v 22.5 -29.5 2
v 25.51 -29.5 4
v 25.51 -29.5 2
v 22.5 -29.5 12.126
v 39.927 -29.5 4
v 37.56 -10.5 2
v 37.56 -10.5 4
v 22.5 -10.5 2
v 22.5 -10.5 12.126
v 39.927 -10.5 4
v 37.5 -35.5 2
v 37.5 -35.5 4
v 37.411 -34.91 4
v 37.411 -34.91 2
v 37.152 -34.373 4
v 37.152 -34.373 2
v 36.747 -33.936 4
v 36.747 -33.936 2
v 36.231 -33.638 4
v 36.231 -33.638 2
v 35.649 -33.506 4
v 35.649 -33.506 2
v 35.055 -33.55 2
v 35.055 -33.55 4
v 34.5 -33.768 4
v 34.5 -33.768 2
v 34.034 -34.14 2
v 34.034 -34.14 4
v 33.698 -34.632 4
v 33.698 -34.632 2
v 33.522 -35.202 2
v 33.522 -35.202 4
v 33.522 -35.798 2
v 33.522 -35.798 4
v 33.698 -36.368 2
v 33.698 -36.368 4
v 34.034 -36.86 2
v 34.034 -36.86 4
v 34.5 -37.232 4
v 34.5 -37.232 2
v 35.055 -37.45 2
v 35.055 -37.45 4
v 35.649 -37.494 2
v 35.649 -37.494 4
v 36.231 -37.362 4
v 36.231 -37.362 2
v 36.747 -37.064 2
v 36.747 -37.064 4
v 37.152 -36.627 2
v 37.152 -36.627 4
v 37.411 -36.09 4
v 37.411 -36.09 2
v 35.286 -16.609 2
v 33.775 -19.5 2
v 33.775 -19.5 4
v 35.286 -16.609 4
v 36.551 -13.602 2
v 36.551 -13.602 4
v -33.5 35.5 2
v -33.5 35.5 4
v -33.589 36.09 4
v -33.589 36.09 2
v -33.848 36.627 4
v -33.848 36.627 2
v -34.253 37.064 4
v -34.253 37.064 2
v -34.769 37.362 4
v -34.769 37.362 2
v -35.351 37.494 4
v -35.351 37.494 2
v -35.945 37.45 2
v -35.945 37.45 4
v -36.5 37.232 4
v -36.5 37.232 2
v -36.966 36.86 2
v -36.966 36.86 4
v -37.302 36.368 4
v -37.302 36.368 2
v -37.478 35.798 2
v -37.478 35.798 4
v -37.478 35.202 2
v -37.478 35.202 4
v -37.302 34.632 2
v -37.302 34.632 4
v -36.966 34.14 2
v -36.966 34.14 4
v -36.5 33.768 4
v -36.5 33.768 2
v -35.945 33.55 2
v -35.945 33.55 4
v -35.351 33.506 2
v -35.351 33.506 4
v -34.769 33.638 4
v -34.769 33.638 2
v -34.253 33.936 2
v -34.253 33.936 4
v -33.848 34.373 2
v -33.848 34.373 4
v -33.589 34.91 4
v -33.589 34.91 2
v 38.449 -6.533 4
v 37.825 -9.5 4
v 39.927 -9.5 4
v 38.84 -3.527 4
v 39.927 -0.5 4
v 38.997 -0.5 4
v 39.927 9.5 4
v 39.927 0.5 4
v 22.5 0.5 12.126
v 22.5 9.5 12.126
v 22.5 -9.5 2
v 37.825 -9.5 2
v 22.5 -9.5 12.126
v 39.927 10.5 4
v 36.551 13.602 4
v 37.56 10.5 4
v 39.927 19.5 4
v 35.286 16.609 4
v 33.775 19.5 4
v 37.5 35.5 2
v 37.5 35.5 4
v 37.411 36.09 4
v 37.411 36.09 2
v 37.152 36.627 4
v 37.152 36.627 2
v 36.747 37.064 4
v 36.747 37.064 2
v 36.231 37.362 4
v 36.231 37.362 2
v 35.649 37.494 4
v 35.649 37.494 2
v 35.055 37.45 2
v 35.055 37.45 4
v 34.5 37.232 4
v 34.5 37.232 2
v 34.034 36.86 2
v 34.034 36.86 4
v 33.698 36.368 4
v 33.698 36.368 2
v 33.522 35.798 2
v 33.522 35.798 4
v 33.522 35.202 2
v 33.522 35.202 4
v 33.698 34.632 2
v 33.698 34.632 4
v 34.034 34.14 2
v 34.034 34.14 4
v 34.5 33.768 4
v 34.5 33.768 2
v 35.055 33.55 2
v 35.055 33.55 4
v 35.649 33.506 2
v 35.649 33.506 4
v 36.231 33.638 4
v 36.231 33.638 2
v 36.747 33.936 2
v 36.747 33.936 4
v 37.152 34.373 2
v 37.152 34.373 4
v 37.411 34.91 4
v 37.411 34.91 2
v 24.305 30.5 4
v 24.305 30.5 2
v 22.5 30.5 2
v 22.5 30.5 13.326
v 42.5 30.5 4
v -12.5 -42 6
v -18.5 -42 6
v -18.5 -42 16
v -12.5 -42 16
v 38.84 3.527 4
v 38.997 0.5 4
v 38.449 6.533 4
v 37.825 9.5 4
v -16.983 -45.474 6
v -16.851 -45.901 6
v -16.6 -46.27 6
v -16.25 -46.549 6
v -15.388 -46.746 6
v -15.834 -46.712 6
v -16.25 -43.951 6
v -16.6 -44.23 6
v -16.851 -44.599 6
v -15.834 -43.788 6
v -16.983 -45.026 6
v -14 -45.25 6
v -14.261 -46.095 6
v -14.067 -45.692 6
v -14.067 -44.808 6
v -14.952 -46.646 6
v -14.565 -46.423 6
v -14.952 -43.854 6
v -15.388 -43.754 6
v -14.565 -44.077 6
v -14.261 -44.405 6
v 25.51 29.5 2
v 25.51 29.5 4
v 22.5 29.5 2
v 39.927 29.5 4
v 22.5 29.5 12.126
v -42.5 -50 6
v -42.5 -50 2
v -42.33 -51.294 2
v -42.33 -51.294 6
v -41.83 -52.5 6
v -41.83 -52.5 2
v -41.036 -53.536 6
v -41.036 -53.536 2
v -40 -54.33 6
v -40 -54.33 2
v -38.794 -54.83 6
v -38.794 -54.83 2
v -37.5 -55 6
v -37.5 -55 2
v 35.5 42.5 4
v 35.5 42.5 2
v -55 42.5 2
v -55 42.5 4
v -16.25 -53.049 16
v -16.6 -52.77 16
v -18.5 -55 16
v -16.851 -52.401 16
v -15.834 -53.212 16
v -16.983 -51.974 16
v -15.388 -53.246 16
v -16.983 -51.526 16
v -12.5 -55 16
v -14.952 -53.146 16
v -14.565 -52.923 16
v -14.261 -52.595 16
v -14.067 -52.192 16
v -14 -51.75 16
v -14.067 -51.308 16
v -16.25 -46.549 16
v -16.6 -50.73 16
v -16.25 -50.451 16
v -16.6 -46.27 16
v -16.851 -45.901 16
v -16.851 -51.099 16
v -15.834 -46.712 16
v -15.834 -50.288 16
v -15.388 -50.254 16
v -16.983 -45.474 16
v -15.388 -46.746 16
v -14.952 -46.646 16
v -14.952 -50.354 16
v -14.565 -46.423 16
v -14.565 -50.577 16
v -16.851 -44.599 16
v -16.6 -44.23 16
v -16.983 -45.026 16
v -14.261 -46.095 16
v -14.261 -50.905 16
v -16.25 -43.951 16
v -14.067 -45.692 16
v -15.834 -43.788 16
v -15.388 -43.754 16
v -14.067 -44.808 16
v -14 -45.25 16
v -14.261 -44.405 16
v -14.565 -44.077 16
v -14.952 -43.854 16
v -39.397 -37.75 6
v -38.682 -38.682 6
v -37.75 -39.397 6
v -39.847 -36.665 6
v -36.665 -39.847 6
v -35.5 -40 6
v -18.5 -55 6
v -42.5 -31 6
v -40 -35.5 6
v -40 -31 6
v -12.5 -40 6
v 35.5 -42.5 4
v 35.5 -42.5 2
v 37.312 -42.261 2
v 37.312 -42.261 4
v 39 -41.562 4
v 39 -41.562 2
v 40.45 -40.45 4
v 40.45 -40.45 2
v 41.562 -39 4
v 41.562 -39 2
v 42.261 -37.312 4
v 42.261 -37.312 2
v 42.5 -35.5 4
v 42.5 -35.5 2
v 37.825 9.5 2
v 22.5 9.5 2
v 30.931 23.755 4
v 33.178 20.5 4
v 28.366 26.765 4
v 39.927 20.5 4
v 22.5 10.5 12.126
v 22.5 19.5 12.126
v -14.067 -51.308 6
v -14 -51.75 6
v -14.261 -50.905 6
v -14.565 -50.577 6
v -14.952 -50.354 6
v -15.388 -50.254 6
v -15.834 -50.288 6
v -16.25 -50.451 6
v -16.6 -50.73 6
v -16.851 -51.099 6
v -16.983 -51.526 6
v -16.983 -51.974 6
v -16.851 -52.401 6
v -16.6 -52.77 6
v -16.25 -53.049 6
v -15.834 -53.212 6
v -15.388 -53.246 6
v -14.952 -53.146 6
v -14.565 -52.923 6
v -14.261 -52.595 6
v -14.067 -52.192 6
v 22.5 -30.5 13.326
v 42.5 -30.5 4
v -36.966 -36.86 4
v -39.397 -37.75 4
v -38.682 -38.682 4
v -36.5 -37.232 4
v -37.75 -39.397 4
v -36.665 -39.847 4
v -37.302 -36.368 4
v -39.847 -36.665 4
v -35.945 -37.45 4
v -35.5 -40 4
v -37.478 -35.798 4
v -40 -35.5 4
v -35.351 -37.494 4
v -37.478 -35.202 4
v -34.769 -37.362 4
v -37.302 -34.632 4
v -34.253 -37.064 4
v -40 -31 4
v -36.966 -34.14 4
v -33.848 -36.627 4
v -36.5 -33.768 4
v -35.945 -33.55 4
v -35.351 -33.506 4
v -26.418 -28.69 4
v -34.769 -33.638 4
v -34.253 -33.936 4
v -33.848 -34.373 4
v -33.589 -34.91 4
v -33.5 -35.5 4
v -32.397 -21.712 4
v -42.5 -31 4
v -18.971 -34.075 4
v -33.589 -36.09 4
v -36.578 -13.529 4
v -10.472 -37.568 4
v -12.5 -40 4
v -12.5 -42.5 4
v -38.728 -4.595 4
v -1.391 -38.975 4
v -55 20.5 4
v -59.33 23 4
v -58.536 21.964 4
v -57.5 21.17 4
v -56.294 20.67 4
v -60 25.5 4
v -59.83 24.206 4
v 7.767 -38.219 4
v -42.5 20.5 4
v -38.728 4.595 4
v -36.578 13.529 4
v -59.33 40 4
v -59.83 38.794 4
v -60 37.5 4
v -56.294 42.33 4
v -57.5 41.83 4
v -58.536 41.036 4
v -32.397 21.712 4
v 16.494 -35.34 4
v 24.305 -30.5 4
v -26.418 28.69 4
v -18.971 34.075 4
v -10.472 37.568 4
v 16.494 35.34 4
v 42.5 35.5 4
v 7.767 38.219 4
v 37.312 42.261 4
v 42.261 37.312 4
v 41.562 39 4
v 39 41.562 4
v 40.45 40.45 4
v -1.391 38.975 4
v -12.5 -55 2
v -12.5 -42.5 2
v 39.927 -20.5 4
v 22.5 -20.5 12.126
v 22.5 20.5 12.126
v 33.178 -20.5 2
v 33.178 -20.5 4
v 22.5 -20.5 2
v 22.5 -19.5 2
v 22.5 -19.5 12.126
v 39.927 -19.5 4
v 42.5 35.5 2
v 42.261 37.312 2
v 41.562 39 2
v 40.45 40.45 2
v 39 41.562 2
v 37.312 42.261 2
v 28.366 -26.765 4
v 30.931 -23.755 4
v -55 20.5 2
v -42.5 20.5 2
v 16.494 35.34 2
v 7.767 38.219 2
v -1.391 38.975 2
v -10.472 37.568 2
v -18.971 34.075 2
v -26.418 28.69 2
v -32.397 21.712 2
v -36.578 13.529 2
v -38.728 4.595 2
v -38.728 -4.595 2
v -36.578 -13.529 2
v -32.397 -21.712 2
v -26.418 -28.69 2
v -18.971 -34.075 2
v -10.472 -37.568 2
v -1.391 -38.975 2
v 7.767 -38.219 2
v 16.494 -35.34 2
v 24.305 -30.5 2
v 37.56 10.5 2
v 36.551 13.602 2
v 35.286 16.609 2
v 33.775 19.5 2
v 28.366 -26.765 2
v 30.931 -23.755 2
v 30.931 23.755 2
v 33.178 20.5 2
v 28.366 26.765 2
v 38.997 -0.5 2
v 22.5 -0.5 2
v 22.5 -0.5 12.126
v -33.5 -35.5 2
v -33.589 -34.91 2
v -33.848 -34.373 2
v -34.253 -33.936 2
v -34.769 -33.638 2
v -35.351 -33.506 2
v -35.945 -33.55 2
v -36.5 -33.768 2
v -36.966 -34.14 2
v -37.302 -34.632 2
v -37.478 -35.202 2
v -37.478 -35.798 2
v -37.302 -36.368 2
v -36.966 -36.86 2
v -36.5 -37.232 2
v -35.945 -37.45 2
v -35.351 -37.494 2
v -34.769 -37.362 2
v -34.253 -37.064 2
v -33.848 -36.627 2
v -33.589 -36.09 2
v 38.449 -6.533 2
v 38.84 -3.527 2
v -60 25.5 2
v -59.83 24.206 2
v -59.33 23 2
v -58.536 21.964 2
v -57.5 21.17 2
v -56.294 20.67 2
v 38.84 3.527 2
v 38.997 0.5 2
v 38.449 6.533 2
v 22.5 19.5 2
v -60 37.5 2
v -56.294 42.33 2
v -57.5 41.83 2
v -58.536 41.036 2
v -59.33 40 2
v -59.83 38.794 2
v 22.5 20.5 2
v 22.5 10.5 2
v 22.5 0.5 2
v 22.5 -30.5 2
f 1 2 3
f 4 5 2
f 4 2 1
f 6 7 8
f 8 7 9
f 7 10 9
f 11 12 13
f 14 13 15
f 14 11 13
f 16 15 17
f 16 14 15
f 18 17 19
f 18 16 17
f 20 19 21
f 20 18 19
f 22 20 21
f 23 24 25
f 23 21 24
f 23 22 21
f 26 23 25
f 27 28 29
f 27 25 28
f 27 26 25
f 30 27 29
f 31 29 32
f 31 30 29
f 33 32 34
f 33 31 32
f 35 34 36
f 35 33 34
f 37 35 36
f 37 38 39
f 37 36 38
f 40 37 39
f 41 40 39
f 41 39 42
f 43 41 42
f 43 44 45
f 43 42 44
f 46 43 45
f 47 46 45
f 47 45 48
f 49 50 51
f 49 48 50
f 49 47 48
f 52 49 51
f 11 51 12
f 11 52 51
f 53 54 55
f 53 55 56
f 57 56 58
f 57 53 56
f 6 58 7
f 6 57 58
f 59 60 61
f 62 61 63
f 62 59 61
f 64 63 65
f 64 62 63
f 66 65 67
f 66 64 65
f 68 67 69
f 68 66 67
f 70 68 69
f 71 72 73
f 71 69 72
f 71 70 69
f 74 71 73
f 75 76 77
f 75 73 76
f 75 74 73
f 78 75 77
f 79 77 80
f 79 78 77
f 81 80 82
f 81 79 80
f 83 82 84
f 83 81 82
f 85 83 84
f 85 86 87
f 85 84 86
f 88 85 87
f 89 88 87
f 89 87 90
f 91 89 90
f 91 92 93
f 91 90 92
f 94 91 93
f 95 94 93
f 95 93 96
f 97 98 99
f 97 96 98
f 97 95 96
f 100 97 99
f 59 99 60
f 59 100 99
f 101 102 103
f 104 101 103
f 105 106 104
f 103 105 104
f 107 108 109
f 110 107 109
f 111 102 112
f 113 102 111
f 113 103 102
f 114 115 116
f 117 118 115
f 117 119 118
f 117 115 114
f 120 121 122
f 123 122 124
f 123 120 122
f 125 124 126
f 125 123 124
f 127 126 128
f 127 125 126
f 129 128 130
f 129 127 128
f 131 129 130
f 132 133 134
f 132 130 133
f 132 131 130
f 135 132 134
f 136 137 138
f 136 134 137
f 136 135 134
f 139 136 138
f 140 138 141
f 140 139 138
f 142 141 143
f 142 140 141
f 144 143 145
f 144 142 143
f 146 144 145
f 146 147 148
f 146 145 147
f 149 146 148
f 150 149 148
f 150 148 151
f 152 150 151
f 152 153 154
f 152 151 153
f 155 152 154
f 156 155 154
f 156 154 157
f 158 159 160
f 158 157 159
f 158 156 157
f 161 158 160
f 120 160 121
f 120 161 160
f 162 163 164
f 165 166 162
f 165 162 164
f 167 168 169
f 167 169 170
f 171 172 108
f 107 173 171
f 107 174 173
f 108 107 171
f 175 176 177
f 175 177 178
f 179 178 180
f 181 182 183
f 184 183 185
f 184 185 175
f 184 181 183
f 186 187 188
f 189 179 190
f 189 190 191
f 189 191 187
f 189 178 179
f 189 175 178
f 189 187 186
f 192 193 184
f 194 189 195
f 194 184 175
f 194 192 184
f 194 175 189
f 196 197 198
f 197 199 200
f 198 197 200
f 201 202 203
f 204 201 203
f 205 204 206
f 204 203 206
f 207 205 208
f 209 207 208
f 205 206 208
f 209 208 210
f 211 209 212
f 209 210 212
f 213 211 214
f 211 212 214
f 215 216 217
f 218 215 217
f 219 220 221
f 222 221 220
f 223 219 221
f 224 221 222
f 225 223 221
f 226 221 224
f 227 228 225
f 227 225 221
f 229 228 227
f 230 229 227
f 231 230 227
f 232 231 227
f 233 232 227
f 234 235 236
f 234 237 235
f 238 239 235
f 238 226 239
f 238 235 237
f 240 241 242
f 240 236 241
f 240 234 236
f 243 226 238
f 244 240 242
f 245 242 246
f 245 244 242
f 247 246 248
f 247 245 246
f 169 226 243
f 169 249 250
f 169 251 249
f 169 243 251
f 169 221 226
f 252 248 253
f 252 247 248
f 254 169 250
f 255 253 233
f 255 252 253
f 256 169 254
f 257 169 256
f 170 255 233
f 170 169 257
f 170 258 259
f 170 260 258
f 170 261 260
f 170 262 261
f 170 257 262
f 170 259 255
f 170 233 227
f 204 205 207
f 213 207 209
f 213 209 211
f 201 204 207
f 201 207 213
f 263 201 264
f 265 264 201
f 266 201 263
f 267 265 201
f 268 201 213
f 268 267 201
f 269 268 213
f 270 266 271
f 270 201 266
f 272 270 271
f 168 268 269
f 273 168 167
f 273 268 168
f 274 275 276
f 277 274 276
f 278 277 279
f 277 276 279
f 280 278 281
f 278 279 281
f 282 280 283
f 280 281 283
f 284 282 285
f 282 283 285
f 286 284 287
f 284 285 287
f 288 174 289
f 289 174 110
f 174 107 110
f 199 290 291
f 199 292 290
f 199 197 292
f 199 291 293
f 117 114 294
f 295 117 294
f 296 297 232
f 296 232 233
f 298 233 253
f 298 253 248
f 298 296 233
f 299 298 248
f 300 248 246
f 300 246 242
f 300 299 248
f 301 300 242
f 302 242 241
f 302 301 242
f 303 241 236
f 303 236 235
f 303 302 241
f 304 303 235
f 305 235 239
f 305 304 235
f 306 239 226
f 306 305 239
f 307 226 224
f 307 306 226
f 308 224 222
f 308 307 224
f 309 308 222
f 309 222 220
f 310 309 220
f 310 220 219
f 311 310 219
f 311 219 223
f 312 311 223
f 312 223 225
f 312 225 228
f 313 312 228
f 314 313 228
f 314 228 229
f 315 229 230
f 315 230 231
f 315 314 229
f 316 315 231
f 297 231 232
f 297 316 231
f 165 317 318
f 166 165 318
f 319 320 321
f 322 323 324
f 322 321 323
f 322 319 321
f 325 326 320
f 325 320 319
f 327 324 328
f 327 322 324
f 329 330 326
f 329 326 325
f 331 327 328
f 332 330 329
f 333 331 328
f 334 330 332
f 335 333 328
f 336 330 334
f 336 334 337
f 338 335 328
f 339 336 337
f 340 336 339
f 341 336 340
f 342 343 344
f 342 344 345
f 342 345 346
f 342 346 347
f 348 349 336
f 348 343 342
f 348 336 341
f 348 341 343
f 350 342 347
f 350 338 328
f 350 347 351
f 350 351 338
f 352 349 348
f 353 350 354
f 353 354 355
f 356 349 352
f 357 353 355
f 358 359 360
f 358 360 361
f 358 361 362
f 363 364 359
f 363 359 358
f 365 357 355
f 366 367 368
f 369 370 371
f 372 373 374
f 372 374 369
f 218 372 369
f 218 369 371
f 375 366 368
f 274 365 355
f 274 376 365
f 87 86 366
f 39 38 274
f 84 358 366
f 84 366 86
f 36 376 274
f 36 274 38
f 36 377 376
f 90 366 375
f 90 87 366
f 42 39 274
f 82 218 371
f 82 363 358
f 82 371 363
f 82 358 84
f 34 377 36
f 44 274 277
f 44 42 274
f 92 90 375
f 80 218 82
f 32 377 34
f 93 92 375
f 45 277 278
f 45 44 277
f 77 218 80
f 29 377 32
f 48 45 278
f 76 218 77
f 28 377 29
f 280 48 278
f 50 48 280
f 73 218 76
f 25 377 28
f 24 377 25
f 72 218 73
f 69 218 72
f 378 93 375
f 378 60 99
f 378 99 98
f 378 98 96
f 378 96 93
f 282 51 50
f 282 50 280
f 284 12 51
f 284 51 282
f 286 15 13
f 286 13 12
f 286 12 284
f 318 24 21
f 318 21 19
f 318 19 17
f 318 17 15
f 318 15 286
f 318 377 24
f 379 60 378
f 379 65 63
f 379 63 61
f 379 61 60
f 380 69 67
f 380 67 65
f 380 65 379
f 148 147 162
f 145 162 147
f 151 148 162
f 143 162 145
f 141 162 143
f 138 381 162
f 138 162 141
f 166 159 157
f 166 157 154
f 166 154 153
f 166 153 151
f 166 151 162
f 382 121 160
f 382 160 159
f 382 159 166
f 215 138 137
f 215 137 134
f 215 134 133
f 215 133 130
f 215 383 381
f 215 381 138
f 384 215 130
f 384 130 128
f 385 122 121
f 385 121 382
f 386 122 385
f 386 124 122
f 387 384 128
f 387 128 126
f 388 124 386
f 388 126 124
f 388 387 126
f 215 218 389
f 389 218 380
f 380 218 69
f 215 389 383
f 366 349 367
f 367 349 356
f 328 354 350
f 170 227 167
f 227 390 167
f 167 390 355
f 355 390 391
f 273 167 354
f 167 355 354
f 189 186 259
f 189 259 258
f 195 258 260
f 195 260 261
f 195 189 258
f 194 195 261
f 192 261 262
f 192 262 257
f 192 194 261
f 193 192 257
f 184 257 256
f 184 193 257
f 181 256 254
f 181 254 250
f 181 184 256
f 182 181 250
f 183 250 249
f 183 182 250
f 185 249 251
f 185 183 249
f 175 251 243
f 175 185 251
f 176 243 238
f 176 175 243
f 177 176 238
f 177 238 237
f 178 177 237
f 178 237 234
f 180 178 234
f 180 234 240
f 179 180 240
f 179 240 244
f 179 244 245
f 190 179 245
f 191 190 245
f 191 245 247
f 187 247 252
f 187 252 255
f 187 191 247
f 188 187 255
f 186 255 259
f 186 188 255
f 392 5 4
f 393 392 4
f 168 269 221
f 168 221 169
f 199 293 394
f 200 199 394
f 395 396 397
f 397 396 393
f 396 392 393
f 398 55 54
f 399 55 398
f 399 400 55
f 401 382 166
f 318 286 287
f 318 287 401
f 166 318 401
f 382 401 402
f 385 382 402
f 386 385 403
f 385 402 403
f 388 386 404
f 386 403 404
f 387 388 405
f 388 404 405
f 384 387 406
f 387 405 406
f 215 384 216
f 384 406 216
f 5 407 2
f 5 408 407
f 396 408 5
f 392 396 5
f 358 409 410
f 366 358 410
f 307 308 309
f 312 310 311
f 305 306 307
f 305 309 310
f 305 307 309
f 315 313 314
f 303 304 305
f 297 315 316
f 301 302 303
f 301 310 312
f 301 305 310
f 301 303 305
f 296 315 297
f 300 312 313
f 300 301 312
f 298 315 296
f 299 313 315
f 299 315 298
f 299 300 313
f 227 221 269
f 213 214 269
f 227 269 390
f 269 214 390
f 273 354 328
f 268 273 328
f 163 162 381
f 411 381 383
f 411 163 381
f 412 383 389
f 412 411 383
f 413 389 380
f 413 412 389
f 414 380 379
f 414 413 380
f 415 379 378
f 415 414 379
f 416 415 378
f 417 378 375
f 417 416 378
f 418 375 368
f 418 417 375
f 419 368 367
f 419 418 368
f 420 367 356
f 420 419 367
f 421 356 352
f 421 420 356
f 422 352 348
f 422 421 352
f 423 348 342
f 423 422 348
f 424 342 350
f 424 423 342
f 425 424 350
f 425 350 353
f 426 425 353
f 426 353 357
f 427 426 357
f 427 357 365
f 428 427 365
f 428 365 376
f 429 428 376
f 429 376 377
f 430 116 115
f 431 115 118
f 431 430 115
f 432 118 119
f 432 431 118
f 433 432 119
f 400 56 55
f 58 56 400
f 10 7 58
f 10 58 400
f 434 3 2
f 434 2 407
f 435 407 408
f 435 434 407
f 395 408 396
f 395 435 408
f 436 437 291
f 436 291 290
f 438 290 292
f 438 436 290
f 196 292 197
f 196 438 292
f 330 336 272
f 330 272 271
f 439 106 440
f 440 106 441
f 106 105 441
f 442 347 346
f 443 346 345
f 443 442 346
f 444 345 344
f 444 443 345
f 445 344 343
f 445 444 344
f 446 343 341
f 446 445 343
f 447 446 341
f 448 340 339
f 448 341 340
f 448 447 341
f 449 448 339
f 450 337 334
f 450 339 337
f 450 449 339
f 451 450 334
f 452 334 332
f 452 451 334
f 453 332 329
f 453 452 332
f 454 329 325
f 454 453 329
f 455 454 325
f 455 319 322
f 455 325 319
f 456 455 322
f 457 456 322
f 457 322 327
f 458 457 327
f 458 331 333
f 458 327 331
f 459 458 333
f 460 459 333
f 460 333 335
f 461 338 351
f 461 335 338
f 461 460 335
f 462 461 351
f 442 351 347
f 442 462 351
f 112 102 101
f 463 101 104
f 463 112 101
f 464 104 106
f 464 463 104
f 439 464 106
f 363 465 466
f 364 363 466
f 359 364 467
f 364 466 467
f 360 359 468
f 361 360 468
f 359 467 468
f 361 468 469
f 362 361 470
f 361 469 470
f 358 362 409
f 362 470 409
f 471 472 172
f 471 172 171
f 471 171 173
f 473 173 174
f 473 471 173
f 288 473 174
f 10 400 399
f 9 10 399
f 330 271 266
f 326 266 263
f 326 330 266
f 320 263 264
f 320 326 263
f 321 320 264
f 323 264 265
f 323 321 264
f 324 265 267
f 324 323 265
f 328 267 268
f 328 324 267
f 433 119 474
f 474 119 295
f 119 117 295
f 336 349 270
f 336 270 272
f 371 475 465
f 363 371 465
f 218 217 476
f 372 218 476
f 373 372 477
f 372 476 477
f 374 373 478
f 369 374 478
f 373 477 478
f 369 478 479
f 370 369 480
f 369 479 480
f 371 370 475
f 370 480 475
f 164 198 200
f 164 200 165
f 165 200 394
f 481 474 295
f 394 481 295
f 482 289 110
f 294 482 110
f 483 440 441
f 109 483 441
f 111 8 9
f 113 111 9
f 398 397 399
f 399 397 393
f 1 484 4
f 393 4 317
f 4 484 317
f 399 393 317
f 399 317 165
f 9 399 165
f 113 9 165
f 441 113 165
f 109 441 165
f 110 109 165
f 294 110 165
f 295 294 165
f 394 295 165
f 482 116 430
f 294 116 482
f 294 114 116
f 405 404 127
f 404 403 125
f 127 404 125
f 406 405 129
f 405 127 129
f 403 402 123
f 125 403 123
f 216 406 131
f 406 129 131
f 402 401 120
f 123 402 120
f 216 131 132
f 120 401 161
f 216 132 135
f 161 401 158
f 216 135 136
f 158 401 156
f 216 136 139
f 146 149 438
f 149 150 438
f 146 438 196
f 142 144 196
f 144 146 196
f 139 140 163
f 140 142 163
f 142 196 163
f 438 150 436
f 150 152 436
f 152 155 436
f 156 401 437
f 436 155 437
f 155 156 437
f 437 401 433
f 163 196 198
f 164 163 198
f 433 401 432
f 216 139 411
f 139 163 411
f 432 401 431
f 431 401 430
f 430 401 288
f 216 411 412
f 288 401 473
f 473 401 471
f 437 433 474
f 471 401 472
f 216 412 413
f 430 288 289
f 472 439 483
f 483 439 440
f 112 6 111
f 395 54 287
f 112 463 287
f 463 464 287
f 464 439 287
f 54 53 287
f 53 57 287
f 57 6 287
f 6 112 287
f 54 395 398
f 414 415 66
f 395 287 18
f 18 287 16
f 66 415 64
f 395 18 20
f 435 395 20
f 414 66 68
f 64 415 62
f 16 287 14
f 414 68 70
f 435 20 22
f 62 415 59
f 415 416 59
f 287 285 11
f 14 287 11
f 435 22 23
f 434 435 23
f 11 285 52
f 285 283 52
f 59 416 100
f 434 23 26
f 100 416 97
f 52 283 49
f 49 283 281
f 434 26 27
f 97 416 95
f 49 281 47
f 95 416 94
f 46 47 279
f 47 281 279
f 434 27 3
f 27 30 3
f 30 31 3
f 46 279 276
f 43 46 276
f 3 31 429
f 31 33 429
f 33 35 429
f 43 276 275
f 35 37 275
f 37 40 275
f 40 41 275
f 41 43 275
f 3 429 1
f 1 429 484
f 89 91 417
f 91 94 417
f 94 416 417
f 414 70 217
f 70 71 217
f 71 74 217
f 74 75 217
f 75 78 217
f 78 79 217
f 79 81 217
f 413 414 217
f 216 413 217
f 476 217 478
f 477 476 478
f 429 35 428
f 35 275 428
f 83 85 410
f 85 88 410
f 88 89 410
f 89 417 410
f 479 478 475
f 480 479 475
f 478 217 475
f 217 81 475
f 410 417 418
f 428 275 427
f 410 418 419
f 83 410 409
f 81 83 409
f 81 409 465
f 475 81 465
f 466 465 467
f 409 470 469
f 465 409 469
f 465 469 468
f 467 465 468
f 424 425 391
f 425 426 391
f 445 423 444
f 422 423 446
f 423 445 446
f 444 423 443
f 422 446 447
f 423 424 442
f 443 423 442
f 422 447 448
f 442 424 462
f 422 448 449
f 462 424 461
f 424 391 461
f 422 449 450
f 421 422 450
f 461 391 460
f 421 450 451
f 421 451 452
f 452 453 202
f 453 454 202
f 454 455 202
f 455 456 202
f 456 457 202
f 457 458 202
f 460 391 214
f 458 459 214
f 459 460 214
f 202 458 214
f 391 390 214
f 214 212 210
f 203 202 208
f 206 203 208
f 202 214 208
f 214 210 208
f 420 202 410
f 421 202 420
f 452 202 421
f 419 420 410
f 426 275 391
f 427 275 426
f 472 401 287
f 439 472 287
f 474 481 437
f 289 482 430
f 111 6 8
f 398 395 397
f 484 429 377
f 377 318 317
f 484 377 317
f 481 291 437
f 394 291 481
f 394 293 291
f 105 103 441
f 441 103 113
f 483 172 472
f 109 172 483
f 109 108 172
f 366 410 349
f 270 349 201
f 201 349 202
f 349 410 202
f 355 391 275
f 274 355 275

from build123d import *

# Parameters (mm, degrees)
SKETCH003_R         = 39
PAD002_DEPTH        = 2
PAD009_DEPTH        = 4
SKETCH011_W         = 6
SKETCH011_H         = 13
SKETCH011_R         = 1.5
PAD011_DEPTH        = 10
PAD012_DEPTH        = 2
SKETCH013_R         = 2
SKETCH013_R_2       = 39
POCKET_DEPTH        = 0.001
POCKET_DEPTH_BACK   = 14.001
PAD003_DEPTH        = 29.5
PAD006_DEPTH        = 0.5
LINEARPATTERN_COUNT = 7
LINEARPATTERN_PITCH = 10


with BuildPart() as part:
    # Sketch003 → Pad002 (new body)
    with BuildSketch(Plane.XY):
        with BuildLine():
            Line((-42.5, 35.5), (-42.5, -42.5))
            Line((-42.5, -42.5), (35.5, -42.5))
            ThreePointArc((35.5, -42.5), (40.449747, -40.449747), (42.5, -35.5))
            Line((42.5, -35.5), (42.5, 35.5))
            ThreePointArc((42.5, 35.5), (40.449747, 40.449747), (35.5, 42.5))
            Line((35.5, 42.5), (-35.5, 42.5))
            ThreePointArc((-35.5, 42.5), (-40.449747, 40.449747), (-42.5, 35.5))
        make_face()
        Circle(SKETCH003_R, mode=Mode.SUBTRACT)
    extrude(amount=PAD002_DEPTH)

    # Sketch009 → Pad009 (join)
    with BuildSketch(Plane.XY):
        with BuildLine():
            Line((-42.5, -31), (-42.5, -50))
            ThreePointArc((-42.5, -50), (-41.035534, -53.535534), (-37.5, -55))
            Line((-37.5, -55), (-12.5, -55))
            Line((-12.5, -55), (-12.5, -40))
            Line((-12.5, -40), (-35.5, -40))
            ThreePointArc((-40, -35.5), (-38.681981, -38.681981), (-35.5, -40))
            Line((-40, -31), (-40, -35.5))
            Line((-42.5, -31), (-40, -31))
        make_face()
    extrude(amount=PAD009_DEPTH)

    # Sketch011 → Pad011 (join)
    with BuildSketch(Plane.XY.offset(4)):
        with Locations((-15.5, -48.5)):
            Rectangle(SKETCH011_W, SKETCH011_H)
        with Locations((-15.5, -45.25)):
            Circle(SKETCH011_R, mode=Mode.SUBTRACT)
        with Locations((-15.5, -51.75)):
            Circle(SKETCH011_R, mode=Mode.SUBTRACT)
    extrude(amount=PAD011_DEPTH)

    # Sketch012 → Pad012 (join)
    with BuildSketch(Plane.XY):
        with BuildLine():
            Line((-60, 37.5), (-60, 25.5))
            ThreePointArc((-60, 25.5), (-58.535534, 21.964466), (-55, 20.5))
            Line((-55, 20.5), (-35.5, 20.5))
            Line((-35.5, 20.5), (-35.5, 42.5))
            Line((-35.5, 42.5), (-55, 42.5))
            ThreePointArc((-55, 42.5), (-58.535534, 41.035534), (-60, 37.5))
        make_face()
    extrude(amount=PAD012_DEPTH)

    # Sketch013 → Pocket (cut, two sides)
    with BuildSketch(Plane.XY) as pocket_sk:
        with Locations((-35.5, 35.5)):
            Circle(SKETCH013_R)
        with Locations((35.5, 35.5)):
            Circle(SKETCH013_R)
        with Locations((35.5, -35.5)):
            Circle(SKETCH013_R)
        with Locations((-35.5, -35.5)):
            Circle(SKETCH013_R)
        Circle(SKETCH013_R_2)
    extrude(amount=-POCKET_DEPTH, mode=Mode.SUBTRACT)
    extrude(pocket_sk.sketch, amount=POCKET_DEPTH_BACK, mode=Mode.SUBTRACT)

    # Sketch002 → Pad003 (join, symmetric)
    with BuildSketch(Plane.XZ):
        Polygon((22.5, 11.326153), (42.5, 2), (42.5, 0.8), (22.5, 10.126153), align=None)
    extrude(amount=PAD003_DEPTH, both=True)

    # Sketch006 → Pad006 (join, symmetric)
    with BuildSketch(Plane.XZ.offset(-30)):
        Polygon((22.5, 11.326153), (42.5, 2), (42.5, 0), (22.5, 0), align=None)
    pad006 = extrude(amount=PAD006_DEPTH, both=True)

    # LinearPattern: Pad006 ×7
    with Locations(*[(0, -i * LINEARPATTERN_PITCH, 0) for i in range(1, LINEARPATTERN_COUNT)]):
        add(pad006)


with BuildPart() as part_1:
    # Body001 placement: moved
    add(part.part.moved(Location((0, 0, 2))))


solid = part_1.part
